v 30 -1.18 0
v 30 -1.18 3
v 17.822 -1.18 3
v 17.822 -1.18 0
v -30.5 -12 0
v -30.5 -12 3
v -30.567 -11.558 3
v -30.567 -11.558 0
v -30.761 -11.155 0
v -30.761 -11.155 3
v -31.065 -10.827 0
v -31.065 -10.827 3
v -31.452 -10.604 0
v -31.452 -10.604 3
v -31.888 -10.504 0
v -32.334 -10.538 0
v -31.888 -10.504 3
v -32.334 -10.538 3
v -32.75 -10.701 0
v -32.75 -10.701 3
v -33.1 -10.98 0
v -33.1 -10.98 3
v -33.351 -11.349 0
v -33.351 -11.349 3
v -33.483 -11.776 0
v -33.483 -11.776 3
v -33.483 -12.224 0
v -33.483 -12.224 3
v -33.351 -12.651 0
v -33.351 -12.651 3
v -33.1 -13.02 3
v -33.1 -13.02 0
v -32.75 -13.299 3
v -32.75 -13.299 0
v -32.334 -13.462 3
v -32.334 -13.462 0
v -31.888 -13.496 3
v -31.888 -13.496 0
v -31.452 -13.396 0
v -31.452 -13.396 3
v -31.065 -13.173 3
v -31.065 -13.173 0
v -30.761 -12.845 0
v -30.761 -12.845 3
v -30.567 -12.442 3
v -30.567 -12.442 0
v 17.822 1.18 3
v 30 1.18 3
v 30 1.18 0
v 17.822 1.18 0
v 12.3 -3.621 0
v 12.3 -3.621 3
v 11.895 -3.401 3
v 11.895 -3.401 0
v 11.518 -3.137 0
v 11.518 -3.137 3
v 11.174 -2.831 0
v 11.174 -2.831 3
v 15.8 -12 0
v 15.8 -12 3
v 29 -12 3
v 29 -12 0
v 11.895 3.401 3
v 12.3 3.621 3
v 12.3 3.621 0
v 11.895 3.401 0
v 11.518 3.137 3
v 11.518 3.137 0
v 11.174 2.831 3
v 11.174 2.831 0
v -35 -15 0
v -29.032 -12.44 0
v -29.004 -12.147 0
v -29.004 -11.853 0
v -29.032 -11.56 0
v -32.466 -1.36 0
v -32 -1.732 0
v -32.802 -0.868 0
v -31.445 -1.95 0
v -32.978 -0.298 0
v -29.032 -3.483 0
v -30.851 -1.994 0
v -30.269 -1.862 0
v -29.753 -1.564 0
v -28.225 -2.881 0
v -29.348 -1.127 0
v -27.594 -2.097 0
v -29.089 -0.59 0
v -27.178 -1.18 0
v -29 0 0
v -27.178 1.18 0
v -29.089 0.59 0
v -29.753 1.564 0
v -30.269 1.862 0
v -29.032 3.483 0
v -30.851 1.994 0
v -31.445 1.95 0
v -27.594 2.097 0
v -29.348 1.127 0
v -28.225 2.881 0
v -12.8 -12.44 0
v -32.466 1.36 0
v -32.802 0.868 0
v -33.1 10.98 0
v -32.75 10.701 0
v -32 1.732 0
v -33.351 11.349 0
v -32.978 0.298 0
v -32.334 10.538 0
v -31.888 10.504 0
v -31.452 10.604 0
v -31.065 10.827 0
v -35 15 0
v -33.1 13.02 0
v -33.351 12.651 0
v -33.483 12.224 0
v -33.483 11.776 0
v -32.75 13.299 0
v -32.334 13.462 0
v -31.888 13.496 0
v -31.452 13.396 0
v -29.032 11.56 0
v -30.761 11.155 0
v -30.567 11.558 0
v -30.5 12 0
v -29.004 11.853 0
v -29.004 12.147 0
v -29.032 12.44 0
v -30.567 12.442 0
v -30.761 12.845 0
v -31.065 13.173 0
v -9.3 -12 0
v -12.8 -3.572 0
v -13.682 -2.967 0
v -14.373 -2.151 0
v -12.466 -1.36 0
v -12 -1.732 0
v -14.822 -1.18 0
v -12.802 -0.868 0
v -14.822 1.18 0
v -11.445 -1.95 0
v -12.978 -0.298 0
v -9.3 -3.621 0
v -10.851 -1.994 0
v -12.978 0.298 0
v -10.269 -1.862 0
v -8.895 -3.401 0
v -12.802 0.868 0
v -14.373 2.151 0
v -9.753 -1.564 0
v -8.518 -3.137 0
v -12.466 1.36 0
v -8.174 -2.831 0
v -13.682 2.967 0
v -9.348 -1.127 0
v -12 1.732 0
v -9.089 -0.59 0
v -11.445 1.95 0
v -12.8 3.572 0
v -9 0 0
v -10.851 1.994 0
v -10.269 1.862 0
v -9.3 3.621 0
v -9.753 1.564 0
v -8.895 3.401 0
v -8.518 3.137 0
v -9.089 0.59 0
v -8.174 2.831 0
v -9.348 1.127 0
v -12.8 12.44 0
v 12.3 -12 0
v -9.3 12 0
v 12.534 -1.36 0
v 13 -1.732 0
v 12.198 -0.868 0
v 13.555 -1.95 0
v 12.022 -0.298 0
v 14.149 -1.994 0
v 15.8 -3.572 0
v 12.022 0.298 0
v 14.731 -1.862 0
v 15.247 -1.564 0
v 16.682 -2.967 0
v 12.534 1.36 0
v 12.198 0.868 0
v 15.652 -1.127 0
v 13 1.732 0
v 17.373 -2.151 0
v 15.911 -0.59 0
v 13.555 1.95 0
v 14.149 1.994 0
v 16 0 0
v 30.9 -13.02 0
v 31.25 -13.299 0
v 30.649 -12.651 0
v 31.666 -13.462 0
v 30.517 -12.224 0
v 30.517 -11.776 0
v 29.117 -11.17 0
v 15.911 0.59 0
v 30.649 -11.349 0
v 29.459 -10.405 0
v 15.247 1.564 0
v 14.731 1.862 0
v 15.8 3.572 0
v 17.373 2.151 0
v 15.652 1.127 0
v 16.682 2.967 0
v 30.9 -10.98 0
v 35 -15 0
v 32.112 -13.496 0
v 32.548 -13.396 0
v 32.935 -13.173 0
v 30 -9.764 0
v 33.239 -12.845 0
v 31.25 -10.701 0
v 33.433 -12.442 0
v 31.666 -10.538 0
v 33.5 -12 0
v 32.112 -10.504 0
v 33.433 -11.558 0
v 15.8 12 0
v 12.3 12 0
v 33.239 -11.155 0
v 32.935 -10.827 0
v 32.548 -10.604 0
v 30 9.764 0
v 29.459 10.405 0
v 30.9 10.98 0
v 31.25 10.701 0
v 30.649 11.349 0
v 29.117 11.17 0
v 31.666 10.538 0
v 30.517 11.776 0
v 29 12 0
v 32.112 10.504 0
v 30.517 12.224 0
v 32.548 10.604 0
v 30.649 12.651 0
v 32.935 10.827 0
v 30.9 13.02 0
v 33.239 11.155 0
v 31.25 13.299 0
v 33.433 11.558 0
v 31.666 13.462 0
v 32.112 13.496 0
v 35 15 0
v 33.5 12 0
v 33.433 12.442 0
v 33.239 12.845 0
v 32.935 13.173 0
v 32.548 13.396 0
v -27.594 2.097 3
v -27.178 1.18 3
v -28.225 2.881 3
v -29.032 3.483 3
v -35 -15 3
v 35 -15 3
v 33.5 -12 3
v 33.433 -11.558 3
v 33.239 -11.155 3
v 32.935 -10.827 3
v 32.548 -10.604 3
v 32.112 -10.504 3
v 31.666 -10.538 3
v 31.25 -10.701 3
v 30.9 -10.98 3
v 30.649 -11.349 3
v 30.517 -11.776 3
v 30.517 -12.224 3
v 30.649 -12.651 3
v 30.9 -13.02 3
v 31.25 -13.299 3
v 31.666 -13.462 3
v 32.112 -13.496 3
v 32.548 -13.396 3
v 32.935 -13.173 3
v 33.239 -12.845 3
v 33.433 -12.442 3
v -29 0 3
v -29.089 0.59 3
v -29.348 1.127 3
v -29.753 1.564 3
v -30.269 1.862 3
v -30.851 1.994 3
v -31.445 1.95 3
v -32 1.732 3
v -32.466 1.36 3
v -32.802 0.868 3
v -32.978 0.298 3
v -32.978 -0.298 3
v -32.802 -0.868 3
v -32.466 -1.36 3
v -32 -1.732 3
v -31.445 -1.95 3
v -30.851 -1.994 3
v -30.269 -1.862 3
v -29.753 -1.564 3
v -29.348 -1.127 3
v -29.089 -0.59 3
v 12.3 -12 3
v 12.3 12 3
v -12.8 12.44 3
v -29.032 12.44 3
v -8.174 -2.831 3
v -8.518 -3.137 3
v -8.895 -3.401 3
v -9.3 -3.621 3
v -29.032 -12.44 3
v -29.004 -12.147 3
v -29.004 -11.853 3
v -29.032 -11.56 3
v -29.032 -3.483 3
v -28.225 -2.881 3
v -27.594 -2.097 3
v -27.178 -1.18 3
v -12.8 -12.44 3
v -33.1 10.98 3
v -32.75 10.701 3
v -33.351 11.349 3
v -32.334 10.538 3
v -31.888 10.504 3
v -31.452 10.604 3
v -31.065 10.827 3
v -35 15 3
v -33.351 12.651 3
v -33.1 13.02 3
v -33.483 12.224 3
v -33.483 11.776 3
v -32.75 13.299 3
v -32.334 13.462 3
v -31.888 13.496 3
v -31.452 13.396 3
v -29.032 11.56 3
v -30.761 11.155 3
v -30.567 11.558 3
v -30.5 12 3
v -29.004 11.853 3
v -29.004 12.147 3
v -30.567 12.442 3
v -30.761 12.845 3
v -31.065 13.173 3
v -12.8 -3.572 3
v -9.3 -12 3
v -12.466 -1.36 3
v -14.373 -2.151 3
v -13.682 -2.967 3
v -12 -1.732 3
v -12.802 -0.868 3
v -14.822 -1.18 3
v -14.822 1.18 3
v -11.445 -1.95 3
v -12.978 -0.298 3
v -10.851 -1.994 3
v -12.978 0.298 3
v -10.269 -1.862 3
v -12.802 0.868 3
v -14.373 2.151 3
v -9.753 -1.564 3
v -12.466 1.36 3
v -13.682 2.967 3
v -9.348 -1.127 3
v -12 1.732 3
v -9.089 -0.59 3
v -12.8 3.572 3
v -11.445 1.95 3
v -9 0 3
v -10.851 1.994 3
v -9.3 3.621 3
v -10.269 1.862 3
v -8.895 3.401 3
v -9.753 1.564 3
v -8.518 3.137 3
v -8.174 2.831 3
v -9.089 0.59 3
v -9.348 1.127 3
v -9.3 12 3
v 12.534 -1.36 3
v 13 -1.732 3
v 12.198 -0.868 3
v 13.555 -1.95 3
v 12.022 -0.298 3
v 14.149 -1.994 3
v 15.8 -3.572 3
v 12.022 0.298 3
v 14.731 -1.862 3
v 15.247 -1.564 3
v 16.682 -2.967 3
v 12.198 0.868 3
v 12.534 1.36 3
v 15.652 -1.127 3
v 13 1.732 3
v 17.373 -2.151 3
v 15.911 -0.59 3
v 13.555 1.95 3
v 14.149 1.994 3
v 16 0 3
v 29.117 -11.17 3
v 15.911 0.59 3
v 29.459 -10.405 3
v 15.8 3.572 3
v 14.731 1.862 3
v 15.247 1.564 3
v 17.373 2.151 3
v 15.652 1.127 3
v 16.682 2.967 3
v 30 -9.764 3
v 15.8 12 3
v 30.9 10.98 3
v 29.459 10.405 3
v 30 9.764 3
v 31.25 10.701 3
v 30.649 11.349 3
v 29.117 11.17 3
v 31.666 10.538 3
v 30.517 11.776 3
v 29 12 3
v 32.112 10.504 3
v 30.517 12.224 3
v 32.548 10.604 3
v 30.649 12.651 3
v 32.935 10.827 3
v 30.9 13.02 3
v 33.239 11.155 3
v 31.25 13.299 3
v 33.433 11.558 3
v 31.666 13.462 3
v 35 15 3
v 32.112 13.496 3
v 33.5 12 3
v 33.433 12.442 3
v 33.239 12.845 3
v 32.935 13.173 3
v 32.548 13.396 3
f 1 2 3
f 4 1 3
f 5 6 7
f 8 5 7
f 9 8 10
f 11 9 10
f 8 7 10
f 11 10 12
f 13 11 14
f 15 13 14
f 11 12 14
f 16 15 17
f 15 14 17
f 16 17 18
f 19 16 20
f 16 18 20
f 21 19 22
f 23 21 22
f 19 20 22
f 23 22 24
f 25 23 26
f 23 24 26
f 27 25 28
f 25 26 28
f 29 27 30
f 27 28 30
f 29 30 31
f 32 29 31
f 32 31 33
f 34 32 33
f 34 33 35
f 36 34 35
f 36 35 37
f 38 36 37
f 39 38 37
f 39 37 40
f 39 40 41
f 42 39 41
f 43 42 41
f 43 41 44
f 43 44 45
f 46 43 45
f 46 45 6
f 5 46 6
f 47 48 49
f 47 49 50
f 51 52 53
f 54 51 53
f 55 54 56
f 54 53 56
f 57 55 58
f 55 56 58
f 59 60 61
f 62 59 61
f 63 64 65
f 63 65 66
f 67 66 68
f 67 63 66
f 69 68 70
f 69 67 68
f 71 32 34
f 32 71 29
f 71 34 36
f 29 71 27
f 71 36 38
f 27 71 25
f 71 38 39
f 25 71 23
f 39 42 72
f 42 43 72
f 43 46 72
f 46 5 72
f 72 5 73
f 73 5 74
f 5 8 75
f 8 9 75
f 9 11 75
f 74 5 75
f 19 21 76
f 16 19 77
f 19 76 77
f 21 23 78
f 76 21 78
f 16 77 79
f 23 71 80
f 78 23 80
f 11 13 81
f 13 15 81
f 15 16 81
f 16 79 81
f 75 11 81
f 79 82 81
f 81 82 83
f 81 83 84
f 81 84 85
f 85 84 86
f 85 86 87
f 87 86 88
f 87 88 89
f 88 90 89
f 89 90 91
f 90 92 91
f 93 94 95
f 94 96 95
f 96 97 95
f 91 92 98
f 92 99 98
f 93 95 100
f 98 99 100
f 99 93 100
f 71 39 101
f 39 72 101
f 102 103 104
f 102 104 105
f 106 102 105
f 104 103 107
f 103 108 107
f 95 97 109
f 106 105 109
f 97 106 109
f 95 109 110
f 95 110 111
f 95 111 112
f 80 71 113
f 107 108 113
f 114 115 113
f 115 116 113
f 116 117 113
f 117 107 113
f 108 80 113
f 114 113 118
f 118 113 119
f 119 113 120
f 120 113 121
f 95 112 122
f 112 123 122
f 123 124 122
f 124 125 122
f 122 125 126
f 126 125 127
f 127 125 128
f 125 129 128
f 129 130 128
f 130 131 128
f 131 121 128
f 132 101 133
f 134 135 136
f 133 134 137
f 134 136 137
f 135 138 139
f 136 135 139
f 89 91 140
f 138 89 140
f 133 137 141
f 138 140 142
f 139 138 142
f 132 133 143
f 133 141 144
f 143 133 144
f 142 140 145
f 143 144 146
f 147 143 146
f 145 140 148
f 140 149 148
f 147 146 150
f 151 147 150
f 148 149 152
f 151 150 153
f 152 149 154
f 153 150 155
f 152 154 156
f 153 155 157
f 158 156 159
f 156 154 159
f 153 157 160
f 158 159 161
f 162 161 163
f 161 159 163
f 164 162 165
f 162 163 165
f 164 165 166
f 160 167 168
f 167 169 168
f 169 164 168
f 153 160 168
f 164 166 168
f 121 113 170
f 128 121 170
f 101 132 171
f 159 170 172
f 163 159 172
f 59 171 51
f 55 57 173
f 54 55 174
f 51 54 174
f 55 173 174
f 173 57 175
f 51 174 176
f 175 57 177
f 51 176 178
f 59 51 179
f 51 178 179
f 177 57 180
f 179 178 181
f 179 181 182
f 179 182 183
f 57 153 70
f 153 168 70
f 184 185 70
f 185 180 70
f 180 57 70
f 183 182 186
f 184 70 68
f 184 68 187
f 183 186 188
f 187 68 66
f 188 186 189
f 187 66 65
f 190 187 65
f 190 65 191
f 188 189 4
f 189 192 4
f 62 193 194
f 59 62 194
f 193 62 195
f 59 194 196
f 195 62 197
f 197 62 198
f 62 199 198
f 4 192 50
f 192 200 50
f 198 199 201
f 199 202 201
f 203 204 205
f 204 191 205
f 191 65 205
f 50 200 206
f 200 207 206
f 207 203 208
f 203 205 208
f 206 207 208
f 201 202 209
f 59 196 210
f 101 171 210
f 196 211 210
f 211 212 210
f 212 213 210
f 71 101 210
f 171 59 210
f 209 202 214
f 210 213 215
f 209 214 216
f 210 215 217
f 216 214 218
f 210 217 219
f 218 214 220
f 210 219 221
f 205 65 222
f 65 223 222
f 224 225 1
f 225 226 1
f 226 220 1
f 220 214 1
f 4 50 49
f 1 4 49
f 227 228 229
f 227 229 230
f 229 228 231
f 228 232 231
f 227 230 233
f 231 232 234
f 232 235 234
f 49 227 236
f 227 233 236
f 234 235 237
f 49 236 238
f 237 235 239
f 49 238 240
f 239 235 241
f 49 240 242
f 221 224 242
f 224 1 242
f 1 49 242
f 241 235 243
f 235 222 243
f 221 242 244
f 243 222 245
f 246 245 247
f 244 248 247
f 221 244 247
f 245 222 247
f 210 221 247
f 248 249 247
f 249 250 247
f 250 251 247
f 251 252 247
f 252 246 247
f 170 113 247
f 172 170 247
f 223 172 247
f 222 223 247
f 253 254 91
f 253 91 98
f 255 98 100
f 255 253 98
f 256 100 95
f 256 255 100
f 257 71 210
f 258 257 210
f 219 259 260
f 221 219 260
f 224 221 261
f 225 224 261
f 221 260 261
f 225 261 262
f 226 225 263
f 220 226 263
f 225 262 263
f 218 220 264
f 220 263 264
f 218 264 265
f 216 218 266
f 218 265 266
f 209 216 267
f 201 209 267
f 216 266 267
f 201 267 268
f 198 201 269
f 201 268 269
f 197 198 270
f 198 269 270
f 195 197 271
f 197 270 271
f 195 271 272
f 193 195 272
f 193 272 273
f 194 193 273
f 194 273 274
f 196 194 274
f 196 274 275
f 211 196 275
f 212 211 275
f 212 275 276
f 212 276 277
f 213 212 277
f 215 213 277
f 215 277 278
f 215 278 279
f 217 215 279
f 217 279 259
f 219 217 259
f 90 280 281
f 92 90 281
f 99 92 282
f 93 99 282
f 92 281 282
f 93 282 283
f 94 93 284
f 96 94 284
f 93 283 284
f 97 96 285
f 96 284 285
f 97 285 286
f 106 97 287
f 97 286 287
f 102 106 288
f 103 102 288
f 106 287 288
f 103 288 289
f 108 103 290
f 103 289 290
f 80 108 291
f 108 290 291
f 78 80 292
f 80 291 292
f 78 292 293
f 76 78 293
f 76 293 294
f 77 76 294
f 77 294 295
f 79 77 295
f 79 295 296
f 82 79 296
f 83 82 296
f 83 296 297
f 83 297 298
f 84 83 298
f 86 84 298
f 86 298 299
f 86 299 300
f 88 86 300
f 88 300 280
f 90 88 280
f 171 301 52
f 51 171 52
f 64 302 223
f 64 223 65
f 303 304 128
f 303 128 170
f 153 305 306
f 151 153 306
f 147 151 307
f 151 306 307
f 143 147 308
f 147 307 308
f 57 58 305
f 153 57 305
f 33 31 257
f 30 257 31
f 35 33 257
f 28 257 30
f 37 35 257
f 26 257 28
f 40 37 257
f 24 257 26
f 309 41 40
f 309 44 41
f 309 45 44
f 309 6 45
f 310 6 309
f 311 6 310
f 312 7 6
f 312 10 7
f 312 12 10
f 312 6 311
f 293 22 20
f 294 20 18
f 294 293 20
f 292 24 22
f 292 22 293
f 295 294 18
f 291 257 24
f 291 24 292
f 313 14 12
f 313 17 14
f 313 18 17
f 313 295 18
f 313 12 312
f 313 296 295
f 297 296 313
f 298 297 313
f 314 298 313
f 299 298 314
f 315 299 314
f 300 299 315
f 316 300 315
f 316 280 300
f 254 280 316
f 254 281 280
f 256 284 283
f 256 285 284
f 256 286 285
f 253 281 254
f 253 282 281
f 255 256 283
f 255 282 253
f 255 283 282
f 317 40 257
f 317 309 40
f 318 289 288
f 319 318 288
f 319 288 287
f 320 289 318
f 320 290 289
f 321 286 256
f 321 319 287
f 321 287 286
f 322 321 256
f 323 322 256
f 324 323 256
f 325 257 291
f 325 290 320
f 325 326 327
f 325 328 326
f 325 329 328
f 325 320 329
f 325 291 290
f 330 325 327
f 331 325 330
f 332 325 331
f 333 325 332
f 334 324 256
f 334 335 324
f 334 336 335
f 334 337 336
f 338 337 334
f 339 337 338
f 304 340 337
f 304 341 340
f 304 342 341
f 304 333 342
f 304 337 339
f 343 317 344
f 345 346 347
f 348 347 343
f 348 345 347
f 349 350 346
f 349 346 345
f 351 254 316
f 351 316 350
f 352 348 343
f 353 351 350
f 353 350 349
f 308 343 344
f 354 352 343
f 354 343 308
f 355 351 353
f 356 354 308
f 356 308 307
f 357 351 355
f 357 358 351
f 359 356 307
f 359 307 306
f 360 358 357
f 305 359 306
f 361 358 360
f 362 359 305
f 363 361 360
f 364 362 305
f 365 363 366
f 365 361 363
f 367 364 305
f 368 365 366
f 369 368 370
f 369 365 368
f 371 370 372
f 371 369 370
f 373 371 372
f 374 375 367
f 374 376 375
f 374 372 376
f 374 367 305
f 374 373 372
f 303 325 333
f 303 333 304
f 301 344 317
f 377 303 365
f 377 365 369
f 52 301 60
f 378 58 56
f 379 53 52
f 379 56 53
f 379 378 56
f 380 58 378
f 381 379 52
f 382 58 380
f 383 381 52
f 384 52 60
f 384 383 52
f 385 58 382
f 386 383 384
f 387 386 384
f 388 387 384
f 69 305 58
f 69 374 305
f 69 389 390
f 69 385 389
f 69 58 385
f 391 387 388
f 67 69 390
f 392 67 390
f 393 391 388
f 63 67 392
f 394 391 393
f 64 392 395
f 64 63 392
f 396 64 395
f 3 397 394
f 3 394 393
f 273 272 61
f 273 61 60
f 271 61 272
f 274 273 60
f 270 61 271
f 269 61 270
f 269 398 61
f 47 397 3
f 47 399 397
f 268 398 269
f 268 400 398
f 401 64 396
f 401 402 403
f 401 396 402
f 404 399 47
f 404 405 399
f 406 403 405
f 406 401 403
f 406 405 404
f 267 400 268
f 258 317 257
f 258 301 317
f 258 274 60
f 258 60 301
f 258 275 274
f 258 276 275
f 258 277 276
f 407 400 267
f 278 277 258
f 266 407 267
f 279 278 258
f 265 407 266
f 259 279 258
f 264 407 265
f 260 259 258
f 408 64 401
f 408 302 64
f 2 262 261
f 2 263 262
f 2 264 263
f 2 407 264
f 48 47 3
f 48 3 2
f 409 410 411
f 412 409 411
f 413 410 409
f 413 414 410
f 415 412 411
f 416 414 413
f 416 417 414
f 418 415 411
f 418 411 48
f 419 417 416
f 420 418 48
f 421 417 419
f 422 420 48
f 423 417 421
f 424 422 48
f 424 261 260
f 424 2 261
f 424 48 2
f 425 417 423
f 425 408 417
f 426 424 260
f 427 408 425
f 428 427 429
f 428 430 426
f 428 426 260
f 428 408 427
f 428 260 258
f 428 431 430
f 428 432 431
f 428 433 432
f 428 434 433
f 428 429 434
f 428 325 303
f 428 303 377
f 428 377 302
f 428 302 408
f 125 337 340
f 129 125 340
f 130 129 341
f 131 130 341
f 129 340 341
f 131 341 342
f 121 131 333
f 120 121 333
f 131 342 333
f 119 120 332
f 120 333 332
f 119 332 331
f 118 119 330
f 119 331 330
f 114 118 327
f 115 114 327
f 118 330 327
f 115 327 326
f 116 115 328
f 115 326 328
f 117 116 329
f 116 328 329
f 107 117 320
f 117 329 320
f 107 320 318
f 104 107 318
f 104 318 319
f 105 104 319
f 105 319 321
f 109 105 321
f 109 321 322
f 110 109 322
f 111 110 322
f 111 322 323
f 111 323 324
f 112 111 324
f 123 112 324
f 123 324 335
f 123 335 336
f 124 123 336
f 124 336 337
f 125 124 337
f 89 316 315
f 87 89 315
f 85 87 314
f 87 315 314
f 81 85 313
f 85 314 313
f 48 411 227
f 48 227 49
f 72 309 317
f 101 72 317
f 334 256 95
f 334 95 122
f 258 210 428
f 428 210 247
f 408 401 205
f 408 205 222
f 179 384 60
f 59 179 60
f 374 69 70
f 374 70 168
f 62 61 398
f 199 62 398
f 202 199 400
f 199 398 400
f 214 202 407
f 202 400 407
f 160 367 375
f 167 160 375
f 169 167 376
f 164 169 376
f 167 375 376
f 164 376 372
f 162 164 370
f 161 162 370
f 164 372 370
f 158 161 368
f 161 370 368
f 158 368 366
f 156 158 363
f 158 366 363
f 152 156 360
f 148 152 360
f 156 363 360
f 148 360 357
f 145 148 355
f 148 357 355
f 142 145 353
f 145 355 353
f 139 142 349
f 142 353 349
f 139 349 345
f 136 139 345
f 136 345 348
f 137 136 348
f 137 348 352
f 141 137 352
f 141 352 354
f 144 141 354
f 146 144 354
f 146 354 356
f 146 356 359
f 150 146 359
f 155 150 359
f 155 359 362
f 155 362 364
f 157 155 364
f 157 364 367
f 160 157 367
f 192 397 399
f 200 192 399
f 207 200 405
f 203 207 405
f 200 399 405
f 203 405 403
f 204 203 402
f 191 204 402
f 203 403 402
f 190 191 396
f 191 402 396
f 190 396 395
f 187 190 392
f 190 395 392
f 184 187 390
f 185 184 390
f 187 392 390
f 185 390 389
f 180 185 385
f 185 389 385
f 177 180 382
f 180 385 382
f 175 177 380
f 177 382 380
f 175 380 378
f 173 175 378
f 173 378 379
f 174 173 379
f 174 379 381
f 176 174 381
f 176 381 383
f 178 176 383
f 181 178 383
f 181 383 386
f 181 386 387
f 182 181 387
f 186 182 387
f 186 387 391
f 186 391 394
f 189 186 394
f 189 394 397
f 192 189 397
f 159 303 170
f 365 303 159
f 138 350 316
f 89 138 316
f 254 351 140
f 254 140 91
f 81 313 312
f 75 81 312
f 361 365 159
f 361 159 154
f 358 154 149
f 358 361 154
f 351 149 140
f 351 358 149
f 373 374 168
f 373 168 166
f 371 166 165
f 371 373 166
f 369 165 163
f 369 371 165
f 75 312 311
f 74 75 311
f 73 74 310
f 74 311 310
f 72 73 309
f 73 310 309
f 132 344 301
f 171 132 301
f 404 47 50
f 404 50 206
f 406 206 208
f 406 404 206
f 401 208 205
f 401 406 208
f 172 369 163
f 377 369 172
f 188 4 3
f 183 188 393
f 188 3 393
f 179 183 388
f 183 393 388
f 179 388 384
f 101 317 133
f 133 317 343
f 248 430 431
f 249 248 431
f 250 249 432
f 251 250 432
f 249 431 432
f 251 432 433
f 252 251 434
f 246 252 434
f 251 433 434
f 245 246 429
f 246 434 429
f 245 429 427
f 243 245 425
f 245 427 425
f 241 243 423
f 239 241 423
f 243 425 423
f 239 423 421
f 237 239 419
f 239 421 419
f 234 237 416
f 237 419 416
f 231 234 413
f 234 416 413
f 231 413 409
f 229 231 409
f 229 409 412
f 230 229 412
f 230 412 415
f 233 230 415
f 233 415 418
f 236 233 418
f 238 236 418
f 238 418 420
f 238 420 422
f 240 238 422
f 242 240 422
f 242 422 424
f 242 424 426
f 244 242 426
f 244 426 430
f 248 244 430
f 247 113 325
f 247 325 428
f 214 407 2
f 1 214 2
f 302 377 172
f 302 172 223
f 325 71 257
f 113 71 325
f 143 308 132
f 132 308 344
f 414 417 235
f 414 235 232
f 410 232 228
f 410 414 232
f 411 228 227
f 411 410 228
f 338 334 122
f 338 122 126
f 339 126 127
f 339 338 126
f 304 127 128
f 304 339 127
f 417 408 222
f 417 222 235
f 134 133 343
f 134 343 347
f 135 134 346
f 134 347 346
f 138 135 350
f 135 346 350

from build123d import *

# Parameters (mm, degrees)
SKETCH1_W           = 70
SKETCH1_H           = 30
BOSS_EXTRUDE1_DEPTH = 3
SKETCH2_R           = 1.5
SKETCH2_R_2         = 2
CUT_EXTRUDE2_DEPTH  = 4


with BuildPart() as part:
    # Sketch1 → Boss-Extrude1 (new body)
    with BuildSketch(Plane.XY):
        Rectangle(SKETCH1_W, SKETCH1_H)
    extrude(amount=BOSS_EXTRUDE1_DEPTH)

    # Sketch2 → Cut-Extrude2 (cut, through all)
    with BuildSketch(Plane.XY.offset(3)):
        with Locations((32, 12)):
            Circle(SKETCH2_R)
        with Locations((-32, 12)):
            Circle(SKETCH2_R)
        with Locations((32, -12)):
            Circle(SKETCH2_R)
        with Locations((-32, -12)):
            Circle(SKETCH2_R)
        with Locations((-11, 0)):
            Circle(SKETCH2_R_2)
        with Locations((-31, 0)):
            Circle(SKETCH2_R_2)
        with Locations((14, 0)):
            Circle(SKETCH2_R_2)
        with BuildLine():
            Line((-29.032472505, 12.440205142), (-12.8, 12.440205142))
            Line((-12.8, 12.440205142), (-12.8, 3.57211422))
            ThreePointArc((-12.8, 3.57211422), (-14.054873196, 2.582198629), (-14.821990136, 1.179996355))
            Line((-14.821990136, 1.179996355), (-27.178009864, 1.179996355))
            ThreePointArc((-27.178009864, 1.179996355), (-27.884686293, 2.508948087), (-29.032472505, 3.48264778))
            Line((-29.032472505, 3.48264778), (-29.032472505, 11.559794858))
            ThreePointArc((-29.032472505, 11.559794858), (-29, 12), (-29.032472505, 12.440205142))
        make_face()
        with BuildLine():
            Line((11.174466994, 2.831318285), (-8.174466994, 2.831318285))
            ThreePointArc((-8.174466994, 2.831318285), (-8.703062454, 3.274763794), (-9.3, 3.620773398))
            Line((-9.3, 3.620773398), (-9.3, 12))
            Line((-9.3, 12), (12.3, 12))
            Line((12.3, 12), (12.3, 3.620773398))
            ThreePointArc((12.3, 3.620773398), (11.703062454, 3.274763794), (11.174466994, 2.831318285))
        make_face()
        with BuildLine():
            Line((30, 1.179996355), (17.821990136, 1.179996355))
            ThreePointArc((17.821990136, 1.179996355), (17.054873196, 2.582198629), (15.8, 3.57211422))
            Line((15.8, 3.57211422), (15.8, 12))
            Line((15.8, 12), (29, 12))
            ThreePointArc((29, 12), (29.261387212, 10.775255129), (30, 9.763932023))
            Line((30, 9.763932023), (30, 1.179996355))
        make_face()
    cut_extrude2 = extrude(amount=-CUT_EXTRUDE2_DEPTH, mode=Mode.SUBTRACT)

    # Mirror1: Cut-Extrude2 across plane
    add(cut_extrude2.mirror(Plane.ZX), mode=Mode.SUBTRACT)


solid = part.part
